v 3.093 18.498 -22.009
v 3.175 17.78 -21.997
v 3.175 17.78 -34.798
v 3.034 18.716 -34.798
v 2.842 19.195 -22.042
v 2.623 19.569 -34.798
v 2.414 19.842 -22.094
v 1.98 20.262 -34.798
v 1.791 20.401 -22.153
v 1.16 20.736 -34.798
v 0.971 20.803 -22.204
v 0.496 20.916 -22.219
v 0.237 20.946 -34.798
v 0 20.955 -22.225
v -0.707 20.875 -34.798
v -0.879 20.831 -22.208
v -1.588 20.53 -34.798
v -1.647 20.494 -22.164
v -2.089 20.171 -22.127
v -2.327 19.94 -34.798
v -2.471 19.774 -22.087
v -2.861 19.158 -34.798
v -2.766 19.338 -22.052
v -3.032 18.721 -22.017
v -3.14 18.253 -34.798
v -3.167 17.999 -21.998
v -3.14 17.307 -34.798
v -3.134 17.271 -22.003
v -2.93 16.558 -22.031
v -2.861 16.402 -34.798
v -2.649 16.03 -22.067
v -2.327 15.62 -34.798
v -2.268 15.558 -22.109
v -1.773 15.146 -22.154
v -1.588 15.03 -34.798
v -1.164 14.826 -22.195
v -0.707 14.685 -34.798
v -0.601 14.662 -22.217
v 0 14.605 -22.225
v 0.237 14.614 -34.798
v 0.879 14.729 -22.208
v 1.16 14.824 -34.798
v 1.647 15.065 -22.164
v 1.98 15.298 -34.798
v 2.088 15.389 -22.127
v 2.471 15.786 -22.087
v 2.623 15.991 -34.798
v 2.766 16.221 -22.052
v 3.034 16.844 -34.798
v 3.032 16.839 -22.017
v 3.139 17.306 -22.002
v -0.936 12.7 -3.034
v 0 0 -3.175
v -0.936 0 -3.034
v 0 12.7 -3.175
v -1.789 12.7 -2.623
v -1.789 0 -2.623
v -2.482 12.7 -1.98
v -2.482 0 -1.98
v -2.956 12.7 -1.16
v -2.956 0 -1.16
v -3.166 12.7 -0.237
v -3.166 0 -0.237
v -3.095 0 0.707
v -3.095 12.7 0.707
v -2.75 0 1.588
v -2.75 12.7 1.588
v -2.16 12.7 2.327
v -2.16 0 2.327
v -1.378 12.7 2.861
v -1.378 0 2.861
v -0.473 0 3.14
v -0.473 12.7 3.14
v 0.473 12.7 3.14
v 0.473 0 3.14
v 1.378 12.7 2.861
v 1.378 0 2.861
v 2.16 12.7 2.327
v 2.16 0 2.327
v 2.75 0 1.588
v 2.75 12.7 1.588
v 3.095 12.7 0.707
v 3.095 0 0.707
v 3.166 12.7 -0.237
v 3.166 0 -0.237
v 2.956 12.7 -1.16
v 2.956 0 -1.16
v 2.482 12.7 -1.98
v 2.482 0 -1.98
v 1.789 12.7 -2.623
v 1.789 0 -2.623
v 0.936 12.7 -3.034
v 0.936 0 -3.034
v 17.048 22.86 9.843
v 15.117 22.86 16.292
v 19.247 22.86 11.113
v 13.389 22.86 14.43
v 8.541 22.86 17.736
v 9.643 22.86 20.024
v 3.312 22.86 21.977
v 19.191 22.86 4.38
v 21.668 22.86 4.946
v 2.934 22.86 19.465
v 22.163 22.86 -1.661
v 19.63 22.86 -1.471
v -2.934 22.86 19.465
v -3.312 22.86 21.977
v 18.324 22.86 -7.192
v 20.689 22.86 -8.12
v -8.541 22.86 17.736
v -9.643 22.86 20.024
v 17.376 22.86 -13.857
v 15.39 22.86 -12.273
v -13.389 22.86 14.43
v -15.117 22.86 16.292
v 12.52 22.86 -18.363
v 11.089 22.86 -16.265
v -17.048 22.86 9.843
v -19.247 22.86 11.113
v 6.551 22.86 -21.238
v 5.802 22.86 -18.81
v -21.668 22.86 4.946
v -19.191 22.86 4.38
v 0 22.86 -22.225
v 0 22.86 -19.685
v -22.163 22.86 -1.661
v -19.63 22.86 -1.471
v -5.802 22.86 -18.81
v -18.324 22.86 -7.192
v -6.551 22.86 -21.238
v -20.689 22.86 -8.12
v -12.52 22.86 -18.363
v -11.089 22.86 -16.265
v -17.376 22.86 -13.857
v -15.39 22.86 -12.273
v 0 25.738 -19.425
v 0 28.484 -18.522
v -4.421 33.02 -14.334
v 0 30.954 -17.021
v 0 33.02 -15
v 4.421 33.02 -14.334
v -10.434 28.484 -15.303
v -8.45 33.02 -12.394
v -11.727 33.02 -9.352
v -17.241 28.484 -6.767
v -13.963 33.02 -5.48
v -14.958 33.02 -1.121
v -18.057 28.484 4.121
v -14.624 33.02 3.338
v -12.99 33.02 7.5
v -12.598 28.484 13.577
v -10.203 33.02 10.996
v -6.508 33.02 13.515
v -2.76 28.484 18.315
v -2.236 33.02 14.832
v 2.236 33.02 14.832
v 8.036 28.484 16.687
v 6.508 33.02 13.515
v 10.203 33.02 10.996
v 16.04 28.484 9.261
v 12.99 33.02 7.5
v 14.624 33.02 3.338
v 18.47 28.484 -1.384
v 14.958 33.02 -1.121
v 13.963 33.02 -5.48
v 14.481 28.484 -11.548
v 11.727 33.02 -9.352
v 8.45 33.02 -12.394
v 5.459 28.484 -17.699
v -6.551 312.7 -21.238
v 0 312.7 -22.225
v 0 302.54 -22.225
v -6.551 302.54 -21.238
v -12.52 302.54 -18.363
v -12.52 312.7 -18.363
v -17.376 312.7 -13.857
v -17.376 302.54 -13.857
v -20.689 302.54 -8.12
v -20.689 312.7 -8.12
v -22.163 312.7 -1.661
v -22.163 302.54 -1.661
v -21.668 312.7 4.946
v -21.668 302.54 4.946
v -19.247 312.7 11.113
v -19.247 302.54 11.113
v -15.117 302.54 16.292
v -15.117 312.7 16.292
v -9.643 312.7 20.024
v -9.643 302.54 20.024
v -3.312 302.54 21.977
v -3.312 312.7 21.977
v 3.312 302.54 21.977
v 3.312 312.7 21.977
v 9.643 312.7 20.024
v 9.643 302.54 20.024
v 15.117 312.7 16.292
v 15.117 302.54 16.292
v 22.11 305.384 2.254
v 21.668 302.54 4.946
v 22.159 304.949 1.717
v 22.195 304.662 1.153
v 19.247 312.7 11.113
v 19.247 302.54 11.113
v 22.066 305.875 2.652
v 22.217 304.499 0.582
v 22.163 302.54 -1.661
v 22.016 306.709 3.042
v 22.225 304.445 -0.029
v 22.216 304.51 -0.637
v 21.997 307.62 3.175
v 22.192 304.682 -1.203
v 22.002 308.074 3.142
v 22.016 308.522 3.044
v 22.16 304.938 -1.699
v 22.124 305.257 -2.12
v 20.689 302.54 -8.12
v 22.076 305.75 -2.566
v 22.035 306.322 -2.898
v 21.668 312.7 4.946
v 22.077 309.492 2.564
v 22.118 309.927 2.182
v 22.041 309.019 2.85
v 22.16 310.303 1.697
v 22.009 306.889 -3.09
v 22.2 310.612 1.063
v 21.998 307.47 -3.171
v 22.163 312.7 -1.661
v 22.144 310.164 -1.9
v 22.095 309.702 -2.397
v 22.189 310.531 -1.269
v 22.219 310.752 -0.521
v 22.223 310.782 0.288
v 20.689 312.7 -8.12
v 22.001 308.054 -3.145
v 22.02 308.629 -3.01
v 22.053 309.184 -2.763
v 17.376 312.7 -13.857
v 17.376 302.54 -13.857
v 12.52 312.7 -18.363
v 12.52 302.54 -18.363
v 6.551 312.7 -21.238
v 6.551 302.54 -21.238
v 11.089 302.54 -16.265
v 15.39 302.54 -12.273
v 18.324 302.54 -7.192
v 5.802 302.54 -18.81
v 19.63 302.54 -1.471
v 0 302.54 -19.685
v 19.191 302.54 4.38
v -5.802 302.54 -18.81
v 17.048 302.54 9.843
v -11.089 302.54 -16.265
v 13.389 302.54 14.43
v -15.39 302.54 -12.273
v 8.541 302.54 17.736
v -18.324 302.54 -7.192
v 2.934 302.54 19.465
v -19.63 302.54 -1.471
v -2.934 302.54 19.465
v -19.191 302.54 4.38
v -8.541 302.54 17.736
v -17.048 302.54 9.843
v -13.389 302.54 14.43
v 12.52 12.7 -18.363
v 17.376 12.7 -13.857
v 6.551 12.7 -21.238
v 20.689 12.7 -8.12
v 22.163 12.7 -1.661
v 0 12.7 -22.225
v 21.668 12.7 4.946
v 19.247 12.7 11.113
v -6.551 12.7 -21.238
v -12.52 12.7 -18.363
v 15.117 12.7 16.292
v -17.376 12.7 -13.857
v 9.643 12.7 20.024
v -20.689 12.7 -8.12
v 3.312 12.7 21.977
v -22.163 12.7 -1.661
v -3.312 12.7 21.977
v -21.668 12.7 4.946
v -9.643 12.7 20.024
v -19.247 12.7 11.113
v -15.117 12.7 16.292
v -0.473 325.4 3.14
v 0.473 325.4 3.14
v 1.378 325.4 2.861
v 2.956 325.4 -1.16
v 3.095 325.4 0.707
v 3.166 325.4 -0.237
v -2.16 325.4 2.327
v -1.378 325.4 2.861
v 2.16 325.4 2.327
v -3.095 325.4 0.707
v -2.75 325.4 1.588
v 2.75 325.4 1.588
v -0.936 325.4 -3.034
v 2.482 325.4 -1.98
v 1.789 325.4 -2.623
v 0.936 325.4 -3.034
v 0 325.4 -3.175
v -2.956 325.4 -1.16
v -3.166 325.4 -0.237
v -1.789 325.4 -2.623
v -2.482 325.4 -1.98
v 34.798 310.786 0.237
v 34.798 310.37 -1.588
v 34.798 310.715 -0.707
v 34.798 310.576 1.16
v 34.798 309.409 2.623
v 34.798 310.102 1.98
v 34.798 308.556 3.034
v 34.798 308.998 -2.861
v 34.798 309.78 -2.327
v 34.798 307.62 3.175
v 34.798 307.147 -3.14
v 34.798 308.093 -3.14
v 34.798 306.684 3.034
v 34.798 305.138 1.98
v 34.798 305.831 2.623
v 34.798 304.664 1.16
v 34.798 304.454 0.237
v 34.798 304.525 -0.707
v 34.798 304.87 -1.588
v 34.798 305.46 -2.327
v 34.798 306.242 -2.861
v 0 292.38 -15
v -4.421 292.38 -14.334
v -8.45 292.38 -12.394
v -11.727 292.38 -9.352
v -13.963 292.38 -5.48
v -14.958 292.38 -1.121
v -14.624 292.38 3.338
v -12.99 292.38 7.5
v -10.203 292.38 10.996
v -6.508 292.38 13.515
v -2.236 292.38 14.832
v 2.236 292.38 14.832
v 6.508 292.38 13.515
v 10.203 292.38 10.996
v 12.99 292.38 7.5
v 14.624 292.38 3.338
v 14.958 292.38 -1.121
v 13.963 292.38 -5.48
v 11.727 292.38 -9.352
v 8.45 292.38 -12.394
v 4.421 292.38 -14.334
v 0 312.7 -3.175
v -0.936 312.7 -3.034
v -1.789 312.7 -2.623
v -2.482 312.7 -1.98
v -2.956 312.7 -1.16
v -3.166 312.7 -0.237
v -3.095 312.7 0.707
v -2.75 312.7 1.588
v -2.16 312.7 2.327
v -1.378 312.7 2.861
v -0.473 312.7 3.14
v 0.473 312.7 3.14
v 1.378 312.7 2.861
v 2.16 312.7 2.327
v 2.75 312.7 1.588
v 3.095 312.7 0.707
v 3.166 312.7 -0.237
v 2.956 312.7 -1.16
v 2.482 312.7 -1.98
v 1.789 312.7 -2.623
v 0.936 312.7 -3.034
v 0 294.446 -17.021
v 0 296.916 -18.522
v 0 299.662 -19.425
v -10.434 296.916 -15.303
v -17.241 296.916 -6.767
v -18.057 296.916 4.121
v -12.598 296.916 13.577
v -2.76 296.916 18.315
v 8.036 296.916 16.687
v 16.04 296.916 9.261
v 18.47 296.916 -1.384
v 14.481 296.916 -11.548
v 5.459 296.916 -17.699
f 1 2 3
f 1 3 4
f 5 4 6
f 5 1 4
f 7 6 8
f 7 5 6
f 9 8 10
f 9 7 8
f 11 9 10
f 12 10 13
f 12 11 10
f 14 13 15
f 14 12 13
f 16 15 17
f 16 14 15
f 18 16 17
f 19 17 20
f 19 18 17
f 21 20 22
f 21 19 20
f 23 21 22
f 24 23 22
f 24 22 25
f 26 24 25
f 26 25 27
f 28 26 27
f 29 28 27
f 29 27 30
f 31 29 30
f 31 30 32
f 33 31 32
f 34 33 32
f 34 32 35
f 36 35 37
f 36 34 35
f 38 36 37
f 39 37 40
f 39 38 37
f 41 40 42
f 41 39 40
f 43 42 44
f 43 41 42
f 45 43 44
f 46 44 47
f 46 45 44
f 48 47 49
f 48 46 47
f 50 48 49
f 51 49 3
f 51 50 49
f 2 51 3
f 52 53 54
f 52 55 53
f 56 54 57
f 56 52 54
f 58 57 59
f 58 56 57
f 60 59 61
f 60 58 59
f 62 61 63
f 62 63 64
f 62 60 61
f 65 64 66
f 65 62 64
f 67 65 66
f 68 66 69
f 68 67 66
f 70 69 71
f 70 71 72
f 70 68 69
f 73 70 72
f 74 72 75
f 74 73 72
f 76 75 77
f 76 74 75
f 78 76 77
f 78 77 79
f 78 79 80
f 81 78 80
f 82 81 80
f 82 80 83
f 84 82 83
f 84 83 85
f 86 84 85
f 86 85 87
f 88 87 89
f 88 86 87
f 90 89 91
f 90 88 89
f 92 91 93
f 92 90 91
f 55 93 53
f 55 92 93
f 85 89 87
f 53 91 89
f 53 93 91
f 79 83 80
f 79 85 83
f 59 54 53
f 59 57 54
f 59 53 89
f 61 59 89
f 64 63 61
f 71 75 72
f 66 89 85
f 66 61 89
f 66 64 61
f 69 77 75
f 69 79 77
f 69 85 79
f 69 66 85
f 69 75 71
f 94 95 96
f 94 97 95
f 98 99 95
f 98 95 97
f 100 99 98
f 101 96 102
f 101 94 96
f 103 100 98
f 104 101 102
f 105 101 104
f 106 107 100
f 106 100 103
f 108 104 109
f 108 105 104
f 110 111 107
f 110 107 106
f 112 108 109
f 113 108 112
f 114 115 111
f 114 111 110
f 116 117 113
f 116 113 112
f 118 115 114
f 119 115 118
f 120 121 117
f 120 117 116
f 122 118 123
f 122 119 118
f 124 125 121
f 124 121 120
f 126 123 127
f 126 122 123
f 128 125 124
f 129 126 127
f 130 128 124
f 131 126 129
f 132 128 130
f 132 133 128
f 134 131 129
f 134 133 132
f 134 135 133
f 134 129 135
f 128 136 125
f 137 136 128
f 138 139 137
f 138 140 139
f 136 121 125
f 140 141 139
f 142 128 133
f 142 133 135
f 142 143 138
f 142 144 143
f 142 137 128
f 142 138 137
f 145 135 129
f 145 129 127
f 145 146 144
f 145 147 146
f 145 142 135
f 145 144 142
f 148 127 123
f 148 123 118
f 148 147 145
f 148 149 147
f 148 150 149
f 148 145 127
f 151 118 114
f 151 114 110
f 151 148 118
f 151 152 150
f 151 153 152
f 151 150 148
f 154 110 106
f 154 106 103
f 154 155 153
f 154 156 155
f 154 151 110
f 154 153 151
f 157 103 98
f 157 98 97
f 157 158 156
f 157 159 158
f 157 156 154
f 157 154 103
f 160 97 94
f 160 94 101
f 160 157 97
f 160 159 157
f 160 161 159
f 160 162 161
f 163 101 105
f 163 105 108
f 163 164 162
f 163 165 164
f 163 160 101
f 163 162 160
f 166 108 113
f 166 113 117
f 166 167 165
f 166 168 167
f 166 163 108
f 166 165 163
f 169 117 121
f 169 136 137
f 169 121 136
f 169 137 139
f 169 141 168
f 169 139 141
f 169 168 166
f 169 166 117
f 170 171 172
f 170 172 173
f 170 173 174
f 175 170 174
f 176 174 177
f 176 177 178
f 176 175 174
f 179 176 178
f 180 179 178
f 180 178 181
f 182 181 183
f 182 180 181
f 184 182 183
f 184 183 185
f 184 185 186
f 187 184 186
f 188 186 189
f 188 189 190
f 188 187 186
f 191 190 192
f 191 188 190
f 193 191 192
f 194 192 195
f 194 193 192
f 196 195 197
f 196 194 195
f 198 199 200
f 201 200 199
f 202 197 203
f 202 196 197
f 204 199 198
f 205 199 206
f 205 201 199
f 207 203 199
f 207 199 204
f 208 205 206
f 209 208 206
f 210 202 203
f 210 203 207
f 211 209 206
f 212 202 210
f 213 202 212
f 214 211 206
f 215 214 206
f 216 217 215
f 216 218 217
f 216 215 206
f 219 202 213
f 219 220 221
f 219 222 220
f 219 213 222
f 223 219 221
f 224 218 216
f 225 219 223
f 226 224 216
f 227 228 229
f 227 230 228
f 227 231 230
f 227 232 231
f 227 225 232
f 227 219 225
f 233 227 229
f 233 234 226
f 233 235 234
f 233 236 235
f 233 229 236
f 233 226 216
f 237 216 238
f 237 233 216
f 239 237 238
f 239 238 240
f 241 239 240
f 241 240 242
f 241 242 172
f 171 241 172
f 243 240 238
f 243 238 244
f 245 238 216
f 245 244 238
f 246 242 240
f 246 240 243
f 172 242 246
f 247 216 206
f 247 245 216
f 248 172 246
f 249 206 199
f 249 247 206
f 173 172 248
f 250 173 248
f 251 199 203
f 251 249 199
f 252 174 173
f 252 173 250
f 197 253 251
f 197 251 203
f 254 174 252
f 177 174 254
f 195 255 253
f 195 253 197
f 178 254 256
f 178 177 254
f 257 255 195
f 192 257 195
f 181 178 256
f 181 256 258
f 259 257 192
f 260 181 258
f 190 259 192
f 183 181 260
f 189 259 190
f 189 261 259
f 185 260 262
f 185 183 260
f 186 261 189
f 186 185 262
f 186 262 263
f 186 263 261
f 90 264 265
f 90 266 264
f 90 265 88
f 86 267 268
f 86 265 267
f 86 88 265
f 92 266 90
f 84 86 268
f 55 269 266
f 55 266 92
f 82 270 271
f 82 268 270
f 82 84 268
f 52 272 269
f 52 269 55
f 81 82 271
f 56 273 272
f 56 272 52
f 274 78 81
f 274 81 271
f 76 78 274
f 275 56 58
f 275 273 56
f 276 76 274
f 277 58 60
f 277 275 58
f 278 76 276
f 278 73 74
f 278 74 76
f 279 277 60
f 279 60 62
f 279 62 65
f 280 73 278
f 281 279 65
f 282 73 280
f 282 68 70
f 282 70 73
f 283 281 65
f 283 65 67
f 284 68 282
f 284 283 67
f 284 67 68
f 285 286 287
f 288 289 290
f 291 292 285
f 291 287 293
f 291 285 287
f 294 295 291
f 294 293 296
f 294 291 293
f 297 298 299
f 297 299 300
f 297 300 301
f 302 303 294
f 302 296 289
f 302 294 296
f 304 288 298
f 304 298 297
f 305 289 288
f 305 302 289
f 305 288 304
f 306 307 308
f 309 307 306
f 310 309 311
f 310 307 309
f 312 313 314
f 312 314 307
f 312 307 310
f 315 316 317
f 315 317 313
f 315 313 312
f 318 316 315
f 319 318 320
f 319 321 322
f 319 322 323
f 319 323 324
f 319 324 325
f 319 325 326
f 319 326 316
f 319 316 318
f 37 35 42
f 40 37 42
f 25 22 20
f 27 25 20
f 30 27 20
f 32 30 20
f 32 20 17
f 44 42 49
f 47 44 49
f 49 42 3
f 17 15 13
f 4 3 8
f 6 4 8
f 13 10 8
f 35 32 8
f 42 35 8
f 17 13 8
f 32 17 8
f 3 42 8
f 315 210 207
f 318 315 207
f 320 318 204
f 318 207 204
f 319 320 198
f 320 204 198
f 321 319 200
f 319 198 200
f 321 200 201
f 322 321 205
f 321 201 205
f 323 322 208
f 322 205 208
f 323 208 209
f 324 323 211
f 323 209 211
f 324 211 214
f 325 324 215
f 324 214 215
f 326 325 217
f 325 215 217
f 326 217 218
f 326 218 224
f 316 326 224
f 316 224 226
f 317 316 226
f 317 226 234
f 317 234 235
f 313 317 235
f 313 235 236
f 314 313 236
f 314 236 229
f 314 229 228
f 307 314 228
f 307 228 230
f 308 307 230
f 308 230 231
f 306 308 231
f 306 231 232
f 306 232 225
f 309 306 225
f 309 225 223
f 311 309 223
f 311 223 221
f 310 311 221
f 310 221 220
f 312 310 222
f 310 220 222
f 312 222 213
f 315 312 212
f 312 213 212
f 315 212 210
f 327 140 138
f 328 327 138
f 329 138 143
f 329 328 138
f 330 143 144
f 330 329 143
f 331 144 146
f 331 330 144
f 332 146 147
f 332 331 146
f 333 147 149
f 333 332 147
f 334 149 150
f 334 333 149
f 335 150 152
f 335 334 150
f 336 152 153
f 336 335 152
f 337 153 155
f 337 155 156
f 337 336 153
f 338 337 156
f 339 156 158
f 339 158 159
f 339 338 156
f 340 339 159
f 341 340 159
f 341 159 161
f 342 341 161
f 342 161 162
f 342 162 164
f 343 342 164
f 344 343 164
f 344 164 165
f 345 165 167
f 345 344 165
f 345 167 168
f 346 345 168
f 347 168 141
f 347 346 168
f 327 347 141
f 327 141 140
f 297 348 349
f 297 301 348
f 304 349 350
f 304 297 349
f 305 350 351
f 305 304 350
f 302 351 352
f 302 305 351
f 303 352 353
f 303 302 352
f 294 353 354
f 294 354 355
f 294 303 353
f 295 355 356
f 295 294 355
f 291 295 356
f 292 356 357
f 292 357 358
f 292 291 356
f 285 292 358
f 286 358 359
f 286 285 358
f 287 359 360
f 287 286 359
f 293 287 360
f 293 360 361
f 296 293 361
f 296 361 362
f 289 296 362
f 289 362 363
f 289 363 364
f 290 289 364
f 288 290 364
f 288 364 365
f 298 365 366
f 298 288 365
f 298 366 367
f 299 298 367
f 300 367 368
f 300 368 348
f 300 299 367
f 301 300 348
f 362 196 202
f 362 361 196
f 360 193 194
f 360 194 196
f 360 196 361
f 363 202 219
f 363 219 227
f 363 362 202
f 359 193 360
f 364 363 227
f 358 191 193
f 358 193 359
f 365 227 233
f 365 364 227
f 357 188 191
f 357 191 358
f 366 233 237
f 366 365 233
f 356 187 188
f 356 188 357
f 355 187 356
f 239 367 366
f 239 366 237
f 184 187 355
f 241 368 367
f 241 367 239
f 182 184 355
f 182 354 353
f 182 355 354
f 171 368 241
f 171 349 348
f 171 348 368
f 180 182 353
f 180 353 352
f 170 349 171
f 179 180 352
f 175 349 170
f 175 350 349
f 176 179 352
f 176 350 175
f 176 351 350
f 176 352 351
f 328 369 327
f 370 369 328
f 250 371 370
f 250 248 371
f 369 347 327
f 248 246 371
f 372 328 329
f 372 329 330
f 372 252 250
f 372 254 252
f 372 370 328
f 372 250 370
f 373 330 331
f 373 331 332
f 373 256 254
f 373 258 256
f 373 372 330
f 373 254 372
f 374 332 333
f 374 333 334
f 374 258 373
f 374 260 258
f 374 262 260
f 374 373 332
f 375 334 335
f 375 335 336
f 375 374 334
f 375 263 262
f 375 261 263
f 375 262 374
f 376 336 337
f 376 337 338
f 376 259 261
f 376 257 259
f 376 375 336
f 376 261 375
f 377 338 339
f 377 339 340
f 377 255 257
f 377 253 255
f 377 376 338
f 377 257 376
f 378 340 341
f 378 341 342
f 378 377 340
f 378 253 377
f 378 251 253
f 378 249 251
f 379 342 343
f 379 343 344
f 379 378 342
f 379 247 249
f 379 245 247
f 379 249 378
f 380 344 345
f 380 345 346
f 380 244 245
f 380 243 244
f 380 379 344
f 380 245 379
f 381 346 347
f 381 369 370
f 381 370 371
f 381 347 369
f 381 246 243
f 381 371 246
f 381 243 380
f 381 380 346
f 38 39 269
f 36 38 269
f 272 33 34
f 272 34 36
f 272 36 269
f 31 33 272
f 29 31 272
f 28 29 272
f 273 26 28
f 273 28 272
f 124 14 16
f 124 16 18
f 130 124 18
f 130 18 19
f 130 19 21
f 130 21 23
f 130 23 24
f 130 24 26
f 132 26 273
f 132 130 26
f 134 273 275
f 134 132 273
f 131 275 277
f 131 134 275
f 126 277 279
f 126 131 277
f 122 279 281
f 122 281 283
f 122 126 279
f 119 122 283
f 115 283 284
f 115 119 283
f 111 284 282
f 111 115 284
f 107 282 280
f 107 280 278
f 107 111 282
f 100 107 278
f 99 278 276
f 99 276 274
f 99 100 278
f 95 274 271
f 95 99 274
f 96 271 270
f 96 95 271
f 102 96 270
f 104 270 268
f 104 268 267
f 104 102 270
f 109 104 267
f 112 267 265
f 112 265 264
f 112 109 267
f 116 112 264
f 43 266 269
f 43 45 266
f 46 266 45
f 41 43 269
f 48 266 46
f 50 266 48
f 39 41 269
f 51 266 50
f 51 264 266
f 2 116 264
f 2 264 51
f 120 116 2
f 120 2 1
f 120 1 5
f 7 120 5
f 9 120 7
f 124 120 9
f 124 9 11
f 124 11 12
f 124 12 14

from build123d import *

# Parameters (mm, degrees)
SKETCH2_R           = 3.175
BOSS_EXTRUDE1_DEPTH = 34.798
SKETCH3_R           = 3.175
BOSS_EXTRUDE2_DEPTH = 34.798


with BuildPart() as part:
    # Sketch1 → Revolve1 (revolve)
    with BuildSketch(Plane.XY, mode=Mode.PRIVATE) as revolve1_sk:
        with BuildLine():
            Line((15, 33.02), (15, 292.38))
            ThreePointArc((15, 292.38), (18.521588729, 296.916296192), (19.685, 302.54))
            Line((19.685, 302.54), (22.225, 302.54))
            Line((22.225, 302.54), (22.225, 312.7))
            Line((22.225, 312.7), (3.175, 312.7))
            Line((3.175, 312.7), (3.175, 325.4))
            Line((3.175, 325.4), (0, 325.4))
            Line((0, 325.4), (0, 0))
            Line((0, 0), (3.175, 0))
            Line((3.175, 0), (3.175, 12.7))
            Line((3.175, 12.7), (22.225, 12.7))
            Line((22.225, 12.7), (22.225, 22.86))
            Line((22.225, 22.86), (19.685, 22.86))
            ThreePointArc((19.685, 22.86), (18.521588729, 28.483703808), (15, 33.02))
        make_face()
    revolve(revolve1_sk.sketch.rotate(Axis((0, -1025.4, 0), (0, 1, 0)), 90), axis=Axis((0, -1025.4, 0), (0, 1, 0)))

    # Sketch2 → Boss-Extrude1 (add)
    with BuildSketch(Plane(origin=(0, 0, 0), x_dir=(0, 0, -1), z_dir=(1, 0, 0))):
        with Locations(Location((0, 307.62, 0), (0, 0, 180))):
            Circle(SKETCH2_R)
    extrude(amount=BOSS_EXTRUDE1_DEPTH)

    # Sketch3 → Boss-Extrude2 (add)
    with BuildSketch(Plane.XY):
        with Locations((0, 17.78)):
            Circle(SKETCH3_R)
    extrude(amount=-BOSS_EXTRUDE2_DEPTH)


solid = part.part
